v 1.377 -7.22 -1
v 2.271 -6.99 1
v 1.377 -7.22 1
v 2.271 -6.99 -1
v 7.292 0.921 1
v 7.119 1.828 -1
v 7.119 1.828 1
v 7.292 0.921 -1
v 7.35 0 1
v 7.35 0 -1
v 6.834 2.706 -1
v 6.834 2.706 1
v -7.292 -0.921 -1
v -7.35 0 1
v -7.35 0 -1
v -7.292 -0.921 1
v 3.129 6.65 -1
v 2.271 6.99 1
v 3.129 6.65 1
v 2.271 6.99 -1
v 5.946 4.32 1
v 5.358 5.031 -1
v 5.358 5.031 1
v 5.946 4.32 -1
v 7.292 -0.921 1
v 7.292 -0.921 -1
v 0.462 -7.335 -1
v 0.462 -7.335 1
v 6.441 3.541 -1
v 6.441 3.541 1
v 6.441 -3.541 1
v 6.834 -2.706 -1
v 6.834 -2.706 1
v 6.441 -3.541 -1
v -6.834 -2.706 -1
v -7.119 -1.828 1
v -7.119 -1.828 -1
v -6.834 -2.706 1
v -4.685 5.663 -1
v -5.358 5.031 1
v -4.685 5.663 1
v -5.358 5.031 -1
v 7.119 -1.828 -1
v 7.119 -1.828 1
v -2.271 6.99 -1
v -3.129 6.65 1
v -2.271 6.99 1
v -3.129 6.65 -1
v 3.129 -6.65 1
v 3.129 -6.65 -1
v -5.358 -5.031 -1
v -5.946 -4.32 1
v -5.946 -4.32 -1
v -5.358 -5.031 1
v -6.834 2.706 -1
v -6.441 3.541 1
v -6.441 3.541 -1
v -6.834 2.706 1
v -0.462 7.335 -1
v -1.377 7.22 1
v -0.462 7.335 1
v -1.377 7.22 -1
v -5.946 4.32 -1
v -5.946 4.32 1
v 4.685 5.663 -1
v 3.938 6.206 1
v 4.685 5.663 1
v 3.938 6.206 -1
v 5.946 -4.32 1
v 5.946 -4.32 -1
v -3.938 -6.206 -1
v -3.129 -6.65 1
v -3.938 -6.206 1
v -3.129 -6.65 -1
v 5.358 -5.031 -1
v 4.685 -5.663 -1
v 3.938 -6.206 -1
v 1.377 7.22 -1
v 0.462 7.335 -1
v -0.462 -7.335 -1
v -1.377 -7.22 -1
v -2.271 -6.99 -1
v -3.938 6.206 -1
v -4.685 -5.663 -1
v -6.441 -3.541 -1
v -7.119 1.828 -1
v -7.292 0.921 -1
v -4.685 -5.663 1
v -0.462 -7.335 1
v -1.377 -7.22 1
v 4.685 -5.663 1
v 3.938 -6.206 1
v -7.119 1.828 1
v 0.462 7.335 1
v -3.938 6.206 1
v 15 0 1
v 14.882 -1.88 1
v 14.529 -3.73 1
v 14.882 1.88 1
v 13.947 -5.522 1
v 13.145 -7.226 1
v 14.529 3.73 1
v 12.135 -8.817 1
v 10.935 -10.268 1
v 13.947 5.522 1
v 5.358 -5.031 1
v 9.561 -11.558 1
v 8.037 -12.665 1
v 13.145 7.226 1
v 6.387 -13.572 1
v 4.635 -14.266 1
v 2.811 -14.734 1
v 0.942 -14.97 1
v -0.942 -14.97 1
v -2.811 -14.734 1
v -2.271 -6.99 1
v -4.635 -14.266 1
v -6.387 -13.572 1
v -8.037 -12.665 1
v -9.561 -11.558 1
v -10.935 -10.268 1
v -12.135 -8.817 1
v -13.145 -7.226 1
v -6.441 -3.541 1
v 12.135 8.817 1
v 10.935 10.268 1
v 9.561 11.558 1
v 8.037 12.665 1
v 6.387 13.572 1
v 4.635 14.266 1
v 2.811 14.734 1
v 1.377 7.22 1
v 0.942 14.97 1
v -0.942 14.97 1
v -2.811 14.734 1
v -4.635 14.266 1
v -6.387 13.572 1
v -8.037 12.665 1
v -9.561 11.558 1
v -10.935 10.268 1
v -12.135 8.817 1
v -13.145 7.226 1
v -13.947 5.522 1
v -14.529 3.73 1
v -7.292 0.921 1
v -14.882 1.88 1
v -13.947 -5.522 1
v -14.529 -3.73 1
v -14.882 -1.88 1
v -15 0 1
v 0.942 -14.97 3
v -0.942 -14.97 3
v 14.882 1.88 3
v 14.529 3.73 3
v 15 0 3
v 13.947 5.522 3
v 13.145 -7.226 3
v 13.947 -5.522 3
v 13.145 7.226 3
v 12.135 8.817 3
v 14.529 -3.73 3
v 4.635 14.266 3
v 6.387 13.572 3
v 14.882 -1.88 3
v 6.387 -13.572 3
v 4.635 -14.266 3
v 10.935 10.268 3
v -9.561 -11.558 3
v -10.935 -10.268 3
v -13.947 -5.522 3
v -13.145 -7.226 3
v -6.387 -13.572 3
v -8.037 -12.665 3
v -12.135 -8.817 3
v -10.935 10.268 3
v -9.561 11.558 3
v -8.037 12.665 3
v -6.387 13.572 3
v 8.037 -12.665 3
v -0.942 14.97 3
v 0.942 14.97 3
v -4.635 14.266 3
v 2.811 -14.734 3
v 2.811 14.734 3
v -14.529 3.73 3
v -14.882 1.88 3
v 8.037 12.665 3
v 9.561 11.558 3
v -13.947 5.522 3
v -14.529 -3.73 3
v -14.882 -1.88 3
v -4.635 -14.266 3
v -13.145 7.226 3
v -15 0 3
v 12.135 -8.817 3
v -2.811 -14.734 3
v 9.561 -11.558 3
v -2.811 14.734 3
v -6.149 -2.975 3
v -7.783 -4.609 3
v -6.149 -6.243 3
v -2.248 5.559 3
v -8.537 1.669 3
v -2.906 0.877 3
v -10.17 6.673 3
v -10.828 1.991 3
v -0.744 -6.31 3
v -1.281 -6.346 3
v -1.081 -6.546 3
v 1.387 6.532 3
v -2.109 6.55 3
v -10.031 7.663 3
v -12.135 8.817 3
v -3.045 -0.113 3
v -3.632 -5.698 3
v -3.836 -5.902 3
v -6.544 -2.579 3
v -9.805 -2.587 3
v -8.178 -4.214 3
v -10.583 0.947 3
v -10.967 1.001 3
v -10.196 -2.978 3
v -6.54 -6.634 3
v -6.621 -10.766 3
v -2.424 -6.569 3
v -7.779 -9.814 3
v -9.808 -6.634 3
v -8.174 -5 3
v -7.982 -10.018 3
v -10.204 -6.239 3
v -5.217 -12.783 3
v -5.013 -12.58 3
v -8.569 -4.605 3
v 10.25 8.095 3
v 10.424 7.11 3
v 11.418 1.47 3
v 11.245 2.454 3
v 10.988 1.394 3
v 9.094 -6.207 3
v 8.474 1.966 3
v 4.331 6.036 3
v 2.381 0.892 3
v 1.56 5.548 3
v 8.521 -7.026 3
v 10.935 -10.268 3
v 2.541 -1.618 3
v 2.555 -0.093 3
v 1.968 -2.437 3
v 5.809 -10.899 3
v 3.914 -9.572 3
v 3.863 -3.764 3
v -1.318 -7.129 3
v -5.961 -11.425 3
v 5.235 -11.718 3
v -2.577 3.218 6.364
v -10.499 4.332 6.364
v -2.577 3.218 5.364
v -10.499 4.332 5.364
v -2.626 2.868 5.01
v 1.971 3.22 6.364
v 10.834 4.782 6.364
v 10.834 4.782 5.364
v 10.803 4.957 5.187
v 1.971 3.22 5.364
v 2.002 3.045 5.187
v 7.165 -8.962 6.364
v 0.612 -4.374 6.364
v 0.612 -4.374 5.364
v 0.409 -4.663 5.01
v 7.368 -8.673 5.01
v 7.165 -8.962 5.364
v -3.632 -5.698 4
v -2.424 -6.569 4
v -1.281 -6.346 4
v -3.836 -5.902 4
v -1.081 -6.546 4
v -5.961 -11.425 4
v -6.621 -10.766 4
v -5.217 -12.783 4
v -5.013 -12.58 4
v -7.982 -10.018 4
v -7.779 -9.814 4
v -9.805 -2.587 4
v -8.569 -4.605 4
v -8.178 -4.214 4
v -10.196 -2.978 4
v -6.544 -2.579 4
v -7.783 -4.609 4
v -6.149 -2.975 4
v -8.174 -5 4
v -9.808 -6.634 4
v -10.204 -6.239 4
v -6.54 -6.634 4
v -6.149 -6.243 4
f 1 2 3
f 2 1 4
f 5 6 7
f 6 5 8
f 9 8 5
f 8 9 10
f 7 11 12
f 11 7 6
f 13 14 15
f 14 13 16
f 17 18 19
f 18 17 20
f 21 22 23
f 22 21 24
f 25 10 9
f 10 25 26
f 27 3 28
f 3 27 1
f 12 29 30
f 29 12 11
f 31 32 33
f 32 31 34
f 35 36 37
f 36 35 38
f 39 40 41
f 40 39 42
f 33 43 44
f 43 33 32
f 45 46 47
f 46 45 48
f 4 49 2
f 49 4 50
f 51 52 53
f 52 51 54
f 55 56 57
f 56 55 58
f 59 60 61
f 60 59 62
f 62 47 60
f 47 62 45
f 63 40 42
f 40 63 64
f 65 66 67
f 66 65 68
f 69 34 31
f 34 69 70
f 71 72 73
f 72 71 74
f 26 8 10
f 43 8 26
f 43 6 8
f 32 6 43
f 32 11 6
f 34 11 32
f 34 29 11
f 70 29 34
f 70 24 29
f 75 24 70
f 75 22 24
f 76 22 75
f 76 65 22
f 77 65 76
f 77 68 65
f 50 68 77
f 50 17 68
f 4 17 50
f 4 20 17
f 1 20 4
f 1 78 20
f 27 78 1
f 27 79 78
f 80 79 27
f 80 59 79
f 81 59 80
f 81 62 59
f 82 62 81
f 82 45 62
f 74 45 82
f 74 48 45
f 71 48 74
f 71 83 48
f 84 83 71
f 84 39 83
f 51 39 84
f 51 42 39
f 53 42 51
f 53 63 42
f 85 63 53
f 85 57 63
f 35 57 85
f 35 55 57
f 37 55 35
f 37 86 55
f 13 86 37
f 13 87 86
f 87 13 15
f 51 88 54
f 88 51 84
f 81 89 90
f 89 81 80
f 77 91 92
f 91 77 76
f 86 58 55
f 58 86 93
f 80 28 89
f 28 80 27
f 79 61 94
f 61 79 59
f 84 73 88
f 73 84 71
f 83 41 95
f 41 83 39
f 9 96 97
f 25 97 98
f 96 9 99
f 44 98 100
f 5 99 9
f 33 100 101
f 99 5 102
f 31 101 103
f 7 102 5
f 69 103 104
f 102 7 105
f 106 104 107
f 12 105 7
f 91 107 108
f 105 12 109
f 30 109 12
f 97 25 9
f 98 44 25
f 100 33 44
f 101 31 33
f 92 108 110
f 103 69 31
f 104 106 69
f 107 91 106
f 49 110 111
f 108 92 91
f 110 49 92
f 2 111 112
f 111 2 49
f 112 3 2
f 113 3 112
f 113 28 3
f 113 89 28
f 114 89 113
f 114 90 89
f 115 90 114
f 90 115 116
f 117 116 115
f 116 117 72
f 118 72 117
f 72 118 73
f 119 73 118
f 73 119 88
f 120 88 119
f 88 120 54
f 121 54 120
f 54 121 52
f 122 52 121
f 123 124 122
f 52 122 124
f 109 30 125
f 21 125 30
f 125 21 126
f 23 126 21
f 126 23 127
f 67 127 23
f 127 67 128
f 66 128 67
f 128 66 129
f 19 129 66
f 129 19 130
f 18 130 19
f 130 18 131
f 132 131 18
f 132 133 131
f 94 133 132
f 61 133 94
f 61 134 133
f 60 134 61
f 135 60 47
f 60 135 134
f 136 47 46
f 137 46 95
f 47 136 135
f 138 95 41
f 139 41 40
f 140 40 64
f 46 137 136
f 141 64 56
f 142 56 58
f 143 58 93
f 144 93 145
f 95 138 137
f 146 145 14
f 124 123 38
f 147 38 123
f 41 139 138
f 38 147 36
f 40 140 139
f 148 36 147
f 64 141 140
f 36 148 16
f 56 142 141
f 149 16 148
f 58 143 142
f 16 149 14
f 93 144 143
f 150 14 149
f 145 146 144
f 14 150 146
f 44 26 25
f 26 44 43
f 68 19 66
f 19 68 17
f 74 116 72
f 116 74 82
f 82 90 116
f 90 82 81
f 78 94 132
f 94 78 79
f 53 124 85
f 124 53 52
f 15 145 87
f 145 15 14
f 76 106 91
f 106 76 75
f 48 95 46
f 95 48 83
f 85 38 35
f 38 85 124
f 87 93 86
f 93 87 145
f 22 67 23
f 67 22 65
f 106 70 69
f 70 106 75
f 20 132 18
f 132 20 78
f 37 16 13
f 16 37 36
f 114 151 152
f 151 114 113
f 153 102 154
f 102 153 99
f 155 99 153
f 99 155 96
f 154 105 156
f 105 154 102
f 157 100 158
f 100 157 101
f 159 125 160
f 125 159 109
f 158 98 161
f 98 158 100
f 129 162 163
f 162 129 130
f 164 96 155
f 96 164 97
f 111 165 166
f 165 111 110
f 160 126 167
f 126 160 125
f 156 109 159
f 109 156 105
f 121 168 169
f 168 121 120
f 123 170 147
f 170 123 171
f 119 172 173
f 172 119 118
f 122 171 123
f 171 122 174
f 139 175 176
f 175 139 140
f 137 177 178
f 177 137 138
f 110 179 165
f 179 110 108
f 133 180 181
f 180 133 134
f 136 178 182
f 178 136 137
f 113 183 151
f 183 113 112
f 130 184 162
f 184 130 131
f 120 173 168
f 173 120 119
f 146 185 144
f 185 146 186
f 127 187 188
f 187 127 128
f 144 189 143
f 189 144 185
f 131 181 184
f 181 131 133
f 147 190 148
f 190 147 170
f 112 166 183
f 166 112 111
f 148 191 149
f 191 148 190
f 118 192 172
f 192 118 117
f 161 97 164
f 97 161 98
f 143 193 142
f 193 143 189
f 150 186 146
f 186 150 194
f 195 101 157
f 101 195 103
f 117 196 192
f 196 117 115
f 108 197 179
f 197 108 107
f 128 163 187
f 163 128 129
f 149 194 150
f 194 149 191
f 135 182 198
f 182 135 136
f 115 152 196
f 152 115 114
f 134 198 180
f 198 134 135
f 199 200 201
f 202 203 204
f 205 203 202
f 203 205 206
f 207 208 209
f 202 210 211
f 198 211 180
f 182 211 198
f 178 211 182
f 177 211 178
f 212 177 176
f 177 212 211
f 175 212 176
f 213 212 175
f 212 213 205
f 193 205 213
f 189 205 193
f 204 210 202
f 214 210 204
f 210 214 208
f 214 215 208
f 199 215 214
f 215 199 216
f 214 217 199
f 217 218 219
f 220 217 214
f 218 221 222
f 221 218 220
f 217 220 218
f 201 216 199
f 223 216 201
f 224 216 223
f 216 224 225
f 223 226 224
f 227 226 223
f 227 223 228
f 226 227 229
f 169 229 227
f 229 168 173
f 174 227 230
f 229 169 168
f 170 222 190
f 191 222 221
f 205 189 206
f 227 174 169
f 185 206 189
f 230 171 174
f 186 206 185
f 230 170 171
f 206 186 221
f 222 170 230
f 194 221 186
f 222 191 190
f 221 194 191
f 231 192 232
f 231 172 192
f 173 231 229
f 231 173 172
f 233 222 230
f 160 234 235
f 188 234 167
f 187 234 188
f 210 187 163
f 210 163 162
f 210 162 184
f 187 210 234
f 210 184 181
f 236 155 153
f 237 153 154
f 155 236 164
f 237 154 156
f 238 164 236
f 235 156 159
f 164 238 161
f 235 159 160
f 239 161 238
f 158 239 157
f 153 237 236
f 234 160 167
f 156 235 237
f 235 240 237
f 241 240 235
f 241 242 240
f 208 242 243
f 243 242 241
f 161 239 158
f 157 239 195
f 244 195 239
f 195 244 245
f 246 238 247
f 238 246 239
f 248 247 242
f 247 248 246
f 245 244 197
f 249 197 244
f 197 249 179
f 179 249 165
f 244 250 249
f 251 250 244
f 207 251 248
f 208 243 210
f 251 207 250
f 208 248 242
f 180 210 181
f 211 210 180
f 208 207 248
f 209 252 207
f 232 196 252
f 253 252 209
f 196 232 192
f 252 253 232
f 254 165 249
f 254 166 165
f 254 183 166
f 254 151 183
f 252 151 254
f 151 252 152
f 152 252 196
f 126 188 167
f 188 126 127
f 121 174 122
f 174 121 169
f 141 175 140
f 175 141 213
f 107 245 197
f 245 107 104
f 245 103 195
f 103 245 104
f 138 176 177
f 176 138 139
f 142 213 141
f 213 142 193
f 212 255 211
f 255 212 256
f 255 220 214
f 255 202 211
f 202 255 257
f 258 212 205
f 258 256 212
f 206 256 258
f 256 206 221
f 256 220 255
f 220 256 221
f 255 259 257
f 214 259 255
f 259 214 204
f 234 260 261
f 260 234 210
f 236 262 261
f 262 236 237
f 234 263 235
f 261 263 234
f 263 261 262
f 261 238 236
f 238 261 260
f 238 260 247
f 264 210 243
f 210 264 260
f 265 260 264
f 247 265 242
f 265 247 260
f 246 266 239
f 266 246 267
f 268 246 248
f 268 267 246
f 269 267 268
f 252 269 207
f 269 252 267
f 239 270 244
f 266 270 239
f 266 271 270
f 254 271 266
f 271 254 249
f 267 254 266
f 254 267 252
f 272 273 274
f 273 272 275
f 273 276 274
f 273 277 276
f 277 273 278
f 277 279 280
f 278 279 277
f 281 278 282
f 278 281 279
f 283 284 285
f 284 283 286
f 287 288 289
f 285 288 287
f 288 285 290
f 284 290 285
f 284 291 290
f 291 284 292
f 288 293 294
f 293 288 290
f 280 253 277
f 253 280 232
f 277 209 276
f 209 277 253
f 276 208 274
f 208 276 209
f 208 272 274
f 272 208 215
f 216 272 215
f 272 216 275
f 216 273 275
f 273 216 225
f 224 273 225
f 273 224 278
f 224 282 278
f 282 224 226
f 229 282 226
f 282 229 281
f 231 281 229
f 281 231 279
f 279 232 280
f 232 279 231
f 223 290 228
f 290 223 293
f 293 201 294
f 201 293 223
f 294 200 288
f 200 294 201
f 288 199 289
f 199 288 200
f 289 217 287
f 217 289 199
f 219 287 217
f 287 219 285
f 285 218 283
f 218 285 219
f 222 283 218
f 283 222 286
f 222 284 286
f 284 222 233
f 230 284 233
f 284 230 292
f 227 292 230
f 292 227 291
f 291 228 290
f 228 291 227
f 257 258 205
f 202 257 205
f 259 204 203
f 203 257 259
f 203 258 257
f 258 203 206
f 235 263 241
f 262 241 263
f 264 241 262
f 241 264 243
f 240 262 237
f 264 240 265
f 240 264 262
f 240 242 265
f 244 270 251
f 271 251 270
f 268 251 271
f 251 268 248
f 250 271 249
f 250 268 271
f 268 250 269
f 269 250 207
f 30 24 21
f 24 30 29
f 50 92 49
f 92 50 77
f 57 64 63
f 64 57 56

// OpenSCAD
//Auhtor: Louis Huggins
//Project: Coin Holder
//Part: Coin Holder
//Date Start: 11/25/18

// notes on the measurements for the catan pieces
// -14.75mm diameter
// -2mm deep



module settlement() {
	//vars
	radBase = 7.35;
	hBase = 2;



	difference(){
		//additions
		union(){
			//base to fit in the pre-built hole
			cylinder(h=hBase, r=radBase, center=true, $fn=50);
			translate([0,0,hBase]) cylinder(h=hBase, r=15, center=true, $fn=50);
			//tents
			rotate([0,45,82]) translate([0,7,2*hBase]) cube(size=[5,8,5], center=true);
			rotate([0,45,100]) translate([0,-7,2*hBase]) cube(size=[5,9,5], center=true);
			translate([8,-13,0]) rotate([0,45,55]) translate([0,7,2*hBase]) cube(size=[5,8,5], center=true);

			translate([-13, -5,2*hBase-0.5]) rotate(-45) linear_extrude(height=1, center=true, convexity=10, scale=1)
			text("+1", size=8, font="Times New Roman");
		}

		//subtractions
		union(){
			translate([0,0,-1]) rotate([0,45,82]) translate([0,7,2*hBase]) cube(size=[5,10,5], center=true);
			translate([0,0,-1]) rotate([0,45,100]) translate([0,-7,2*hBase]) cube(size=[5,10,5], center=true);
			translate([8,-13,-1]) rotate([0,45,55]) translate([0,7,2*hBase]) cube(size=[5,10,5], center=true);
		}
	}
	cylinder(h=hBase, r=radBase, center=true, $fn=50);
	translate([0,0,hBase]) cylinder(h=hBase, r=15, center=true, $fn=50);
}


settlement();
